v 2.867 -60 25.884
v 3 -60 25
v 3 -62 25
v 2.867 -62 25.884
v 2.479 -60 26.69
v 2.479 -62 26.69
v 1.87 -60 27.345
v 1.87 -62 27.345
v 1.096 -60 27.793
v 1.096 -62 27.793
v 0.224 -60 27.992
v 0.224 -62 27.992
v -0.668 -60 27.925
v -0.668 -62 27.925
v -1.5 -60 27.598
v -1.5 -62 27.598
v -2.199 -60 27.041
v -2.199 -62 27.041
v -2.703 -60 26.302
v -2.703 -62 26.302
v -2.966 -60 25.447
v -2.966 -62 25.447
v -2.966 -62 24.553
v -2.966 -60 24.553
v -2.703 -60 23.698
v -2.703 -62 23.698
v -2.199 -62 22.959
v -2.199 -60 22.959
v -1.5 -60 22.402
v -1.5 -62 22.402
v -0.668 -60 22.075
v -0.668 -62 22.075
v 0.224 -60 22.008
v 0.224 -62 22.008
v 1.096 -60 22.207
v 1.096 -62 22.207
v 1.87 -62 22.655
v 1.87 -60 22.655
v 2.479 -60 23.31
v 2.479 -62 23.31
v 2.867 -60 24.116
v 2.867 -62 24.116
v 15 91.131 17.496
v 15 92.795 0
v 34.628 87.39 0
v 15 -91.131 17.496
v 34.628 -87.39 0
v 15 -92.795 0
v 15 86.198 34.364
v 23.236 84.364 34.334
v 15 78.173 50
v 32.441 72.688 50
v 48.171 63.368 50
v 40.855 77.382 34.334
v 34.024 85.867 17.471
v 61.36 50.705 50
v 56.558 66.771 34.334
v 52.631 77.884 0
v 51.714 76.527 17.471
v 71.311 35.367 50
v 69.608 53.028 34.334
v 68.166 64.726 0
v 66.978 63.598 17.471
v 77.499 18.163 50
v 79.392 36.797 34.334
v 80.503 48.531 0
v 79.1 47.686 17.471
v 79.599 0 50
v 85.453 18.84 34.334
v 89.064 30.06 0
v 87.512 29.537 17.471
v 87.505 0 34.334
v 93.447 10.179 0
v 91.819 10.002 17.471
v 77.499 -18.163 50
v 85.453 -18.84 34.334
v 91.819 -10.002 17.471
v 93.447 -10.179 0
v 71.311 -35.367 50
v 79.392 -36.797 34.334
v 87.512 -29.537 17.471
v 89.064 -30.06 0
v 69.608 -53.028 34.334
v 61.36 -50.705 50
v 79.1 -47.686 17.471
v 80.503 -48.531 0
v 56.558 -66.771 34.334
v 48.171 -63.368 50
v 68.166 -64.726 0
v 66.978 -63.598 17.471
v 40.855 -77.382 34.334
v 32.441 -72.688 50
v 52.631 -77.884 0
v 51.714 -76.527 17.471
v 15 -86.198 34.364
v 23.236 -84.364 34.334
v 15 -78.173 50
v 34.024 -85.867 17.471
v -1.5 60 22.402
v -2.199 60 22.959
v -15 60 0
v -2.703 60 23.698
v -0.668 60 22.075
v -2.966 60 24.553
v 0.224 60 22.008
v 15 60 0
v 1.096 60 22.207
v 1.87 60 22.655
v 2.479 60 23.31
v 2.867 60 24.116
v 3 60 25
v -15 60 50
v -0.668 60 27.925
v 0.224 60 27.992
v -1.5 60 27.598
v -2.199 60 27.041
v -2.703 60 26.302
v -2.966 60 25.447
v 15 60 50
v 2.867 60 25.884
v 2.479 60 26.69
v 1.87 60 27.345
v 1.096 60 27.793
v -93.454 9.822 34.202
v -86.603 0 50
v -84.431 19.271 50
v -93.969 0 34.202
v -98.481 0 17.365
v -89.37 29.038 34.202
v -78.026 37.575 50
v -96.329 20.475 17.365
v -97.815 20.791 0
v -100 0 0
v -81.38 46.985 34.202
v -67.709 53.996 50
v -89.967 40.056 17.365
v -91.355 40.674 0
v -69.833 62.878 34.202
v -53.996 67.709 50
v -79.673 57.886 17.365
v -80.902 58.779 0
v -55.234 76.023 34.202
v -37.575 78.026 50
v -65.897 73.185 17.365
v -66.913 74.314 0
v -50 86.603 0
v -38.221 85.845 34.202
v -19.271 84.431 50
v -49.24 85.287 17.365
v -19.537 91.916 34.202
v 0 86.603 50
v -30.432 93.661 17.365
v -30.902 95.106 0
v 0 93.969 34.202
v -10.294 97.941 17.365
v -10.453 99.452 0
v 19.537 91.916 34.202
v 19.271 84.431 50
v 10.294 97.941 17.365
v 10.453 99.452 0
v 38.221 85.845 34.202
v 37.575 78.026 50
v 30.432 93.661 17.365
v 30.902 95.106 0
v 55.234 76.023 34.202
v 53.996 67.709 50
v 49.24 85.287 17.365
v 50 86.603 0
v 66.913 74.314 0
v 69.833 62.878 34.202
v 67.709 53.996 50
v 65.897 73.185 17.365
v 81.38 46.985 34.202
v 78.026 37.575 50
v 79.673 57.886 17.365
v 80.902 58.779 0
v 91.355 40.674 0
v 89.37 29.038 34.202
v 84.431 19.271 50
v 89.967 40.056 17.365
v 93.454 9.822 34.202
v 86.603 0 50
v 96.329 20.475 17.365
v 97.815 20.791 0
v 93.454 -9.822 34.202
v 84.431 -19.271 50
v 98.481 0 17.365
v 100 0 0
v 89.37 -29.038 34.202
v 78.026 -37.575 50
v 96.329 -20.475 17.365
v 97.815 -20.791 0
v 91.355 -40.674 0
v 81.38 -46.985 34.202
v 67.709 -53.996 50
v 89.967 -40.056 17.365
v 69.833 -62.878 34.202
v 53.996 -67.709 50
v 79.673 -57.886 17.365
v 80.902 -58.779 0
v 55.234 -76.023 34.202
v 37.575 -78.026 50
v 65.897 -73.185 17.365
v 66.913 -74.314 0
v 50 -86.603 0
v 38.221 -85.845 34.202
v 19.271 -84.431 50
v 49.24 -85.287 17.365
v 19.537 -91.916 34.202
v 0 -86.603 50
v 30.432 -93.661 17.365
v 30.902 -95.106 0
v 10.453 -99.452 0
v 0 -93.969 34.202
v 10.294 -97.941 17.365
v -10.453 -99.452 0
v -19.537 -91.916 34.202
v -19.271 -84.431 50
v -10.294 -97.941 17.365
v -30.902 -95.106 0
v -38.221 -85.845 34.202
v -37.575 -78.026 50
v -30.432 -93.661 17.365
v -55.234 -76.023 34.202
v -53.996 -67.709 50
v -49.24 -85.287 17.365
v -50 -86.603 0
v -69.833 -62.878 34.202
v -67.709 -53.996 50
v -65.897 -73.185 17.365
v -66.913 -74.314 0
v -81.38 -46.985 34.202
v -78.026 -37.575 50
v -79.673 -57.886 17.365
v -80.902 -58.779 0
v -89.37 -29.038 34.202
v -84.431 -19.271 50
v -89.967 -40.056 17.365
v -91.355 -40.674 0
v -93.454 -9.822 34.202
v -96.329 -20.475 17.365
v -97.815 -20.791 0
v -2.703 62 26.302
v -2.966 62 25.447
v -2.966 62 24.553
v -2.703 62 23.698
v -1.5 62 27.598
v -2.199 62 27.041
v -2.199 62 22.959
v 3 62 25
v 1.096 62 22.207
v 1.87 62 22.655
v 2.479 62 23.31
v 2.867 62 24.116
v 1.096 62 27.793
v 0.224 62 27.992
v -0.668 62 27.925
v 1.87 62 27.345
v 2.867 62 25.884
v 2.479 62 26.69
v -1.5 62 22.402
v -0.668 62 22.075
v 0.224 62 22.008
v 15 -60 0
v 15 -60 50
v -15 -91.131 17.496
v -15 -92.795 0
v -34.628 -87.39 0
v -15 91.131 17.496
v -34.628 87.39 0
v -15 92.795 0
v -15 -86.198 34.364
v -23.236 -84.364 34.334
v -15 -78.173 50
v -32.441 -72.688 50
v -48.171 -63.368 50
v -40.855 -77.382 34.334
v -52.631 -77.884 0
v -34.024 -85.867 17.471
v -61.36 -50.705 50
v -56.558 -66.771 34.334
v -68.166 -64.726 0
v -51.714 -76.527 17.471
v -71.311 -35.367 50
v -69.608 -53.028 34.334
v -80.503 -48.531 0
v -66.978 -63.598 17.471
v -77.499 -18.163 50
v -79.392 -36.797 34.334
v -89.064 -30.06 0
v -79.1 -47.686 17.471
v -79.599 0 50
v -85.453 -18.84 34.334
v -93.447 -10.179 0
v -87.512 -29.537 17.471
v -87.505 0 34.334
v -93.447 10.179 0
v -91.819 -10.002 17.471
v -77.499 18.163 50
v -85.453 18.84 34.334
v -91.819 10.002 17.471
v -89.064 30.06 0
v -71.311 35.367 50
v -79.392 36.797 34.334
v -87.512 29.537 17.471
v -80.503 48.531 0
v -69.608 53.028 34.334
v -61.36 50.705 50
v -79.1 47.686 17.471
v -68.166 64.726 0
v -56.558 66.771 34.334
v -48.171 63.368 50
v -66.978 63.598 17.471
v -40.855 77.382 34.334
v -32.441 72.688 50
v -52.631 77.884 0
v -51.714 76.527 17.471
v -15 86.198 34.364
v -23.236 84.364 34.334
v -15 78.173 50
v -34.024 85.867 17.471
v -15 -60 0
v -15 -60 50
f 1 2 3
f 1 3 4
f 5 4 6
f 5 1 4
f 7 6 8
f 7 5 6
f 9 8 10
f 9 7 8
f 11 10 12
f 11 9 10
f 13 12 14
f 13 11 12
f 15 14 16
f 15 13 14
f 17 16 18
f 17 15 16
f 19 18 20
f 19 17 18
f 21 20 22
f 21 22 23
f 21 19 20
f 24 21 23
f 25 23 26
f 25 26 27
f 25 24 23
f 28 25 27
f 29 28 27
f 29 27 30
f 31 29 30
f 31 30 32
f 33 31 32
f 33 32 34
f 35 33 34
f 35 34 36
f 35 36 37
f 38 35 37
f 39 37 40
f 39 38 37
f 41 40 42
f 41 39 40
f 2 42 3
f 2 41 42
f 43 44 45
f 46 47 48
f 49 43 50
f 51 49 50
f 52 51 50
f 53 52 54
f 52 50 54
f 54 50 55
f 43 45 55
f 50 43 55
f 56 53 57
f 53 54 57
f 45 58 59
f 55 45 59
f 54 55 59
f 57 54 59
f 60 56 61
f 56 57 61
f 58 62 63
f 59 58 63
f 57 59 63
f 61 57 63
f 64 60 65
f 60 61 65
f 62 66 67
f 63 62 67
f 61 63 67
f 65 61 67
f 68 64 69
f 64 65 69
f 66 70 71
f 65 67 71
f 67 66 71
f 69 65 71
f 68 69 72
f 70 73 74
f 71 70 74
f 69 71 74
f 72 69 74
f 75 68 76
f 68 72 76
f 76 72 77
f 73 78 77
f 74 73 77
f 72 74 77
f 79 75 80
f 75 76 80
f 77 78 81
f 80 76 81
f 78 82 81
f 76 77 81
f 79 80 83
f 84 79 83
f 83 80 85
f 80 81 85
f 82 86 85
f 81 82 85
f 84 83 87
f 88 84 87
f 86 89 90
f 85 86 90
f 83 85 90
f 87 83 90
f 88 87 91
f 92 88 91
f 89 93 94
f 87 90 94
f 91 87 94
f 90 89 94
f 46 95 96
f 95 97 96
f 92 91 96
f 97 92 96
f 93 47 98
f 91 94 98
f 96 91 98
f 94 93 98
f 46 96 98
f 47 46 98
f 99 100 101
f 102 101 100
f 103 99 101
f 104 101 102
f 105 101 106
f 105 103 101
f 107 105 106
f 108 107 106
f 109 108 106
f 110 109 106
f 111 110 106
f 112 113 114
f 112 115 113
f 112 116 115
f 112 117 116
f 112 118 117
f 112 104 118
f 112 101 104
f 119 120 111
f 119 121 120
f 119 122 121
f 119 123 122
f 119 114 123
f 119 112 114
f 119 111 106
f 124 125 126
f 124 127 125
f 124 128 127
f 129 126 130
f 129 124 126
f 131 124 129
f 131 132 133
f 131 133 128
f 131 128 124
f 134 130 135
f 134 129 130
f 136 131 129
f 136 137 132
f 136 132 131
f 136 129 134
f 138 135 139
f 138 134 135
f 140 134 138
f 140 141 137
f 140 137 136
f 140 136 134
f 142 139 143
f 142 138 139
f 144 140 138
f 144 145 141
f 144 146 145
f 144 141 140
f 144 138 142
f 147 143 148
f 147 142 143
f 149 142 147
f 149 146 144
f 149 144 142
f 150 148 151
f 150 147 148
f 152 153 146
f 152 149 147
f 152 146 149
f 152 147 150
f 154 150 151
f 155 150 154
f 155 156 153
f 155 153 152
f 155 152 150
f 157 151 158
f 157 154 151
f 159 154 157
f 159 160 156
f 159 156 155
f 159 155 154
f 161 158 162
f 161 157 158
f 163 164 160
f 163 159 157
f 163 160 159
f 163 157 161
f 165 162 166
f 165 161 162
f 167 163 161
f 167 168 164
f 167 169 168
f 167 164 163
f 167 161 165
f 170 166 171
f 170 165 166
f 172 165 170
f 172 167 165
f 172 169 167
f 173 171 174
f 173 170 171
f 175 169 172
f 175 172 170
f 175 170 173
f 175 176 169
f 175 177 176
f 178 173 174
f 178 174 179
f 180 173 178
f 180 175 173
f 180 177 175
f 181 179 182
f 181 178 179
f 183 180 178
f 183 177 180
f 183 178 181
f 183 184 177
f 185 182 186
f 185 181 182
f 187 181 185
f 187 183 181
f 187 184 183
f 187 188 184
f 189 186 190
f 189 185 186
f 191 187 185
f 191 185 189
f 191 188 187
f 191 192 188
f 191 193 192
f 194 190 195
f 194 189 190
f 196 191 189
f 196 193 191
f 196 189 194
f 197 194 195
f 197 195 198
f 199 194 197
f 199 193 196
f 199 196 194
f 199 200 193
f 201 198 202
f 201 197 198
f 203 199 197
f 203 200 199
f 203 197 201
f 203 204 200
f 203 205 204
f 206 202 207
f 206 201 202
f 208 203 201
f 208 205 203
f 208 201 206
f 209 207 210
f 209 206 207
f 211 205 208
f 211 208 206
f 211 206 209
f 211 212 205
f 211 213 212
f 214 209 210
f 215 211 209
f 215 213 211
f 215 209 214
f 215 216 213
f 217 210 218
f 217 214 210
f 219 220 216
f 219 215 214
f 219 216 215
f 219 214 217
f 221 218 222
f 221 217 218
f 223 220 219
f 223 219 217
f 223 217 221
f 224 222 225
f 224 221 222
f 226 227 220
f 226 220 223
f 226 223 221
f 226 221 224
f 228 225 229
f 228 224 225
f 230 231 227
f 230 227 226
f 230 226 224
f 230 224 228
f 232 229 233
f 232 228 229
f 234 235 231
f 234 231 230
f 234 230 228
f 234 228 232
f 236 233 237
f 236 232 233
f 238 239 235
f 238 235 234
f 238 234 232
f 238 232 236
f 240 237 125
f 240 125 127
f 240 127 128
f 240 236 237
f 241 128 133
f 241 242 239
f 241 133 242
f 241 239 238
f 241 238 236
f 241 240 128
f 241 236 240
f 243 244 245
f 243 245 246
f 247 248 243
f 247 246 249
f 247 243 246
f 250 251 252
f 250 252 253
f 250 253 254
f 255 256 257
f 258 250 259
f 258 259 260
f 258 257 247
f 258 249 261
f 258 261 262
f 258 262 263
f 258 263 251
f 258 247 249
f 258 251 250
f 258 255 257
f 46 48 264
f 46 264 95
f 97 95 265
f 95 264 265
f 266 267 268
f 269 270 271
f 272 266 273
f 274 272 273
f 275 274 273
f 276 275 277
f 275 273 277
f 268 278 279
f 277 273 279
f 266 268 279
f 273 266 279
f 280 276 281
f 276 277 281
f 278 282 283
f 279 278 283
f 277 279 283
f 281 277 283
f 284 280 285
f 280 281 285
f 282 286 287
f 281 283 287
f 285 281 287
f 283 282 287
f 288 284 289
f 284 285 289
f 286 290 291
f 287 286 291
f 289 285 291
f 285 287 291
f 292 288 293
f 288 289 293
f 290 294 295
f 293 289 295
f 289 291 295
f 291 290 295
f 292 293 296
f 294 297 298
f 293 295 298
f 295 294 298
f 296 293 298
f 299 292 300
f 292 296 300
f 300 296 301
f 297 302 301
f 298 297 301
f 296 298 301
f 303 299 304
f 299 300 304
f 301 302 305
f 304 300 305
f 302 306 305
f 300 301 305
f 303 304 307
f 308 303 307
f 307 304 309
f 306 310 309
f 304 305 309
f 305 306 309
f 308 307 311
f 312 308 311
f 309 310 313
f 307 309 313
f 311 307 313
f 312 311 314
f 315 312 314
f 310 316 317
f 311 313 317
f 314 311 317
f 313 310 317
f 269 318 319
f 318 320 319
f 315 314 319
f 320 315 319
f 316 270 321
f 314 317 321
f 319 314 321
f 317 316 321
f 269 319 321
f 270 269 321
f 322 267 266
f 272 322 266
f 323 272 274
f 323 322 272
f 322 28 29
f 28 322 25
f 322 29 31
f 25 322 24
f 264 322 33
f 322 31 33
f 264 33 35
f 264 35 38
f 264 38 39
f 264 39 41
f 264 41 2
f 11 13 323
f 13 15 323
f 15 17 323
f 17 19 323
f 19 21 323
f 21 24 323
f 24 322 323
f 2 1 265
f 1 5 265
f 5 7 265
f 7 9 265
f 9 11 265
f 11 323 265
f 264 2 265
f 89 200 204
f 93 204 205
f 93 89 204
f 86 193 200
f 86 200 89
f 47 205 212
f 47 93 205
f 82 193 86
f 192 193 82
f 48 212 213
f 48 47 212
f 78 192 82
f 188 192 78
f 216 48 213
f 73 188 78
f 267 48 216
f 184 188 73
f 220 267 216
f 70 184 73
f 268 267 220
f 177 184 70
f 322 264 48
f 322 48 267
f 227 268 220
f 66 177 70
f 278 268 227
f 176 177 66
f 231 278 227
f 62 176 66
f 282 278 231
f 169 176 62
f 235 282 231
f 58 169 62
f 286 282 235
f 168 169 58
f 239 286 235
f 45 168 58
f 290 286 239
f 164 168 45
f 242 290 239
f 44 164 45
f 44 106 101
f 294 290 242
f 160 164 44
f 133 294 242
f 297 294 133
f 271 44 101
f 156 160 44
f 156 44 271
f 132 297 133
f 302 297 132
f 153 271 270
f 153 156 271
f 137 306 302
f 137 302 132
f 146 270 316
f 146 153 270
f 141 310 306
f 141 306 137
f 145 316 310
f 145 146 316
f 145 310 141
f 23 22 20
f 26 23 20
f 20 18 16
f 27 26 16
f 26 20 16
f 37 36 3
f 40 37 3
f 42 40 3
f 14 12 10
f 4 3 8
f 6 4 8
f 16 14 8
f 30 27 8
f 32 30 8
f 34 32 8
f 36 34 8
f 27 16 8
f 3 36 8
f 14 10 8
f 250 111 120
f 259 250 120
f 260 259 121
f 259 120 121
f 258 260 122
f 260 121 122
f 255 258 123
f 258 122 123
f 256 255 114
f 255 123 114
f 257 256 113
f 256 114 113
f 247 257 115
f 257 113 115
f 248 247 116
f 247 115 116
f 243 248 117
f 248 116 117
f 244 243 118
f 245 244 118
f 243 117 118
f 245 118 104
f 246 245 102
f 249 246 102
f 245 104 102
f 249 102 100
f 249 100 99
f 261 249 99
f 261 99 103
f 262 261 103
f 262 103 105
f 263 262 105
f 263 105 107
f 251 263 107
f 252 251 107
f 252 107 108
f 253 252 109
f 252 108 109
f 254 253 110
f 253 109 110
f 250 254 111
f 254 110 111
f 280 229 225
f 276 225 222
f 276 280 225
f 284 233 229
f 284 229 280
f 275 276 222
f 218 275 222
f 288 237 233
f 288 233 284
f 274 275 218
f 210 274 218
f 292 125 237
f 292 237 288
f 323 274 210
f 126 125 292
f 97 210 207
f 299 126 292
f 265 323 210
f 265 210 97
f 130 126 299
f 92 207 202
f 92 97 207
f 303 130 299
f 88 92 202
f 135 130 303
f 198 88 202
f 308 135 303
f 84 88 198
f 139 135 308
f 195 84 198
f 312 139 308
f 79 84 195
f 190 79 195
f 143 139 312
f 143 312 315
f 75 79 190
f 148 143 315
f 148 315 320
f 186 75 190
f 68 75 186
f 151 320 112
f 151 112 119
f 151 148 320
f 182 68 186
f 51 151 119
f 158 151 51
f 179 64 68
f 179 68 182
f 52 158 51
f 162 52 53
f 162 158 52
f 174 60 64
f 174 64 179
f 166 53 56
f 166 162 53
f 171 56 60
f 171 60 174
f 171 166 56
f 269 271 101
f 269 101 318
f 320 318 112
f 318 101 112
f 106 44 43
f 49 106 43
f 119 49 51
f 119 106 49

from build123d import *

# Parameters (mm, degrees)
F2_T     = -6
F4_W     = 30
F4_H     = 50
F6_R     = 3
F7_DEPTH = 2


# Not quite as in the source:
# - a pattern or mirror of a feature is missing from the dataset's text; its kind, count and spacing are read off the source's solid


with BuildPart() as f1:
    # F0 (on Front) → F1 (revolve)
    with BuildSketch(Plane.XZ):
        with BuildLine():
            Line((0, 50), (-86.6025403784, 50))
            ThreePointArc((-86.6025403784, 50), (-96.5925826289, 25.8819045103), (-100, 0))
            Line((-100, 0), (0, 0))
            Line((0, 0), (0, 50))
        make_face()
    revolve(axis=Axis((0, 0, 25), (0, 0, -1)))

    # F2
    f2_openings = [f1.faces().sort_by_distance(p)[0] for p in [
        (0, 0, 50),
        (0, 0, 0),
    ]]
    offset(amount=F2_T, openings=f2_openings)

    # F4 (on offset) → F5 (join, up to the next surface of F1)
    with BuildSketch(Plane.XZ.offset(-60)):
        with Locations((0, 25)):
            Rectangle(F4_W, F4_H)
    f5 = extrude(until=Until.NEXT, dir=(0, 1, 0))

    # F5_copies: F5 across plane
    add(f5.mirror(Plane(origin=(0, 0, 0), x_dir=(0, 0, -1), z_dir=(0, -1, 0))))

    # F6 (on face) → F7 (cut)
    with BuildSketch(Plane.XZ.offset(-60)):
        with Locations((0, 25)):
            Circle(F6_R)
    f7 = extrude(amount=-F7_DEPTH, mode=Mode.SUBTRACT)

    # F7_copies: F7 across plane
    add(f7.mirror(Plane(origin=(0, 0, 0), x_dir=(0, 0, -1), z_dir=(0, -1, 0))), mode=Mode.SUBTRACT)


solid = f1.part
